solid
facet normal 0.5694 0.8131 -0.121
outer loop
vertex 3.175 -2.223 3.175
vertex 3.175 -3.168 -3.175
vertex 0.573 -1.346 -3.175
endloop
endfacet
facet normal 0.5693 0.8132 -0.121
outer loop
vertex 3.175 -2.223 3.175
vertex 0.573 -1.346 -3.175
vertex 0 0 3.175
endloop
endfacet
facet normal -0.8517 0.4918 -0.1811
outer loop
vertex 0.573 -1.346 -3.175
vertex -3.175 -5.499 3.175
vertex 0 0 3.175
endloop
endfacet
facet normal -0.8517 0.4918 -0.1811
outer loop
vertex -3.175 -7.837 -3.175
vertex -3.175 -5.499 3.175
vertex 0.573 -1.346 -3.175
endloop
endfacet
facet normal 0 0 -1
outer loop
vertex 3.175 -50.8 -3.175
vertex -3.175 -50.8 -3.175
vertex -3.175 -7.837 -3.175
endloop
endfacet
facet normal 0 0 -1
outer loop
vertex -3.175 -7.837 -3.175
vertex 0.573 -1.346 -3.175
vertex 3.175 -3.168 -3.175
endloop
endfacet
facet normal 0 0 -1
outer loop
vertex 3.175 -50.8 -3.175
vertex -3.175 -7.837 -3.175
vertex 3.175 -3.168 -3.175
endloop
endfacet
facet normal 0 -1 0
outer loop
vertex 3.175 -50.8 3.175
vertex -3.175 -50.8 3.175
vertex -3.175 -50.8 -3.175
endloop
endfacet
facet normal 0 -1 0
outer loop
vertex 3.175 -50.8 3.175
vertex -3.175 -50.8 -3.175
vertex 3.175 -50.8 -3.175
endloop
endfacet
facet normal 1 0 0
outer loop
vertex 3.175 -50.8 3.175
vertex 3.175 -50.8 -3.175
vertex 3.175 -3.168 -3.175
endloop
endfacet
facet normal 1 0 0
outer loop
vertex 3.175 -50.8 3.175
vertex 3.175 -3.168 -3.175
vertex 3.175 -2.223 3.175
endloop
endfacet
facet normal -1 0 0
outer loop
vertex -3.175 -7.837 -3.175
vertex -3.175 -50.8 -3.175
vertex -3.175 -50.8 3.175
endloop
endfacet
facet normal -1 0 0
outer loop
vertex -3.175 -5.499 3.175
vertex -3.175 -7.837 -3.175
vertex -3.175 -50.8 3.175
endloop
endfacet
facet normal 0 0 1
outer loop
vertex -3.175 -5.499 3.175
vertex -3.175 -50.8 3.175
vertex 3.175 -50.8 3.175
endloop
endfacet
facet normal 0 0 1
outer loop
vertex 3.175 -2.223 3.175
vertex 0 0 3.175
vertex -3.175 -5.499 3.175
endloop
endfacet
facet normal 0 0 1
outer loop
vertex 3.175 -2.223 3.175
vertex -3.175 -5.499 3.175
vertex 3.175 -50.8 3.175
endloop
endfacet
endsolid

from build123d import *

# Parameters (mm, degrees)
F0_W     = 6.35
F0_H     = 6.35
F1_DEPTH = 50.8
F6_DEPTH = 25.4
F8_DEPTH = 25.4


with BuildPart() as f1:
    # F0 (on Front) → F1 (new body)
    with BuildSketch(Plane.XZ):
        Rectangle(F0_W, F0_H)
    extrude(amount=F1_DEPTH)

    # F5: sweep along a path in F4
    with BuildLine(Plane.XY.offset(3.175)) as f5_path:
        Line((0, 0), (-7.3544457124, -12.7382736354))
    # F3 (on face) → F5 (sweep, cut)
    with BuildSketch(Plane(origin=(0, 0, 0), x_dir=(-1, 0, 0), z_dir=(0, 1, 0))):
        Polygon((0, -3.175), (0, 3.175), (-1.3497341666, -3.175), align=None)
    sweep(path=f5_path.line, mode=Mode.SUBTRACT)

    # F2 (on face) → F6 (cut)
    with BuildSketch(Plane.XY.offset(3.175)):
        Polygon((-3.175, -5.499261314), (0, 0), (-3.175, 0), align=None)
    extrude(amount=-F6_DEPTH, mode=Mode.SUBTRACT)

    # F7: sweep along a path in F4
    with BuildLine(Plane.XY.offset(3.175)) as f7_path:
        Line((0, 0), (31.0128101016, -21.7154034142))
    # F3 (on face) → F7 (sweep, cut)
    with BuildSketch(Plane(origin=(0, 0, 0), x_dir=(-1, 0, 0), z_dir=(0, 1, 0))):
        Polygon((1.3497341666, -3.175), (0, 3.175), (0, -3.175), align=None)
    sweep(path=f7_path.line, mode=Mode.SUBTRACT)

    # F4 (on face) → F8 (cut)
    with BuildSketch(Plane.XY.offset(3.175)):
        Polygon((3.175, 0), (0, 0), (3.175, -2.2231589338), align=None)
    extrude(amount=-F8_DEPTH, mode=Mode.SUBTRACT)


solid = f1.part
